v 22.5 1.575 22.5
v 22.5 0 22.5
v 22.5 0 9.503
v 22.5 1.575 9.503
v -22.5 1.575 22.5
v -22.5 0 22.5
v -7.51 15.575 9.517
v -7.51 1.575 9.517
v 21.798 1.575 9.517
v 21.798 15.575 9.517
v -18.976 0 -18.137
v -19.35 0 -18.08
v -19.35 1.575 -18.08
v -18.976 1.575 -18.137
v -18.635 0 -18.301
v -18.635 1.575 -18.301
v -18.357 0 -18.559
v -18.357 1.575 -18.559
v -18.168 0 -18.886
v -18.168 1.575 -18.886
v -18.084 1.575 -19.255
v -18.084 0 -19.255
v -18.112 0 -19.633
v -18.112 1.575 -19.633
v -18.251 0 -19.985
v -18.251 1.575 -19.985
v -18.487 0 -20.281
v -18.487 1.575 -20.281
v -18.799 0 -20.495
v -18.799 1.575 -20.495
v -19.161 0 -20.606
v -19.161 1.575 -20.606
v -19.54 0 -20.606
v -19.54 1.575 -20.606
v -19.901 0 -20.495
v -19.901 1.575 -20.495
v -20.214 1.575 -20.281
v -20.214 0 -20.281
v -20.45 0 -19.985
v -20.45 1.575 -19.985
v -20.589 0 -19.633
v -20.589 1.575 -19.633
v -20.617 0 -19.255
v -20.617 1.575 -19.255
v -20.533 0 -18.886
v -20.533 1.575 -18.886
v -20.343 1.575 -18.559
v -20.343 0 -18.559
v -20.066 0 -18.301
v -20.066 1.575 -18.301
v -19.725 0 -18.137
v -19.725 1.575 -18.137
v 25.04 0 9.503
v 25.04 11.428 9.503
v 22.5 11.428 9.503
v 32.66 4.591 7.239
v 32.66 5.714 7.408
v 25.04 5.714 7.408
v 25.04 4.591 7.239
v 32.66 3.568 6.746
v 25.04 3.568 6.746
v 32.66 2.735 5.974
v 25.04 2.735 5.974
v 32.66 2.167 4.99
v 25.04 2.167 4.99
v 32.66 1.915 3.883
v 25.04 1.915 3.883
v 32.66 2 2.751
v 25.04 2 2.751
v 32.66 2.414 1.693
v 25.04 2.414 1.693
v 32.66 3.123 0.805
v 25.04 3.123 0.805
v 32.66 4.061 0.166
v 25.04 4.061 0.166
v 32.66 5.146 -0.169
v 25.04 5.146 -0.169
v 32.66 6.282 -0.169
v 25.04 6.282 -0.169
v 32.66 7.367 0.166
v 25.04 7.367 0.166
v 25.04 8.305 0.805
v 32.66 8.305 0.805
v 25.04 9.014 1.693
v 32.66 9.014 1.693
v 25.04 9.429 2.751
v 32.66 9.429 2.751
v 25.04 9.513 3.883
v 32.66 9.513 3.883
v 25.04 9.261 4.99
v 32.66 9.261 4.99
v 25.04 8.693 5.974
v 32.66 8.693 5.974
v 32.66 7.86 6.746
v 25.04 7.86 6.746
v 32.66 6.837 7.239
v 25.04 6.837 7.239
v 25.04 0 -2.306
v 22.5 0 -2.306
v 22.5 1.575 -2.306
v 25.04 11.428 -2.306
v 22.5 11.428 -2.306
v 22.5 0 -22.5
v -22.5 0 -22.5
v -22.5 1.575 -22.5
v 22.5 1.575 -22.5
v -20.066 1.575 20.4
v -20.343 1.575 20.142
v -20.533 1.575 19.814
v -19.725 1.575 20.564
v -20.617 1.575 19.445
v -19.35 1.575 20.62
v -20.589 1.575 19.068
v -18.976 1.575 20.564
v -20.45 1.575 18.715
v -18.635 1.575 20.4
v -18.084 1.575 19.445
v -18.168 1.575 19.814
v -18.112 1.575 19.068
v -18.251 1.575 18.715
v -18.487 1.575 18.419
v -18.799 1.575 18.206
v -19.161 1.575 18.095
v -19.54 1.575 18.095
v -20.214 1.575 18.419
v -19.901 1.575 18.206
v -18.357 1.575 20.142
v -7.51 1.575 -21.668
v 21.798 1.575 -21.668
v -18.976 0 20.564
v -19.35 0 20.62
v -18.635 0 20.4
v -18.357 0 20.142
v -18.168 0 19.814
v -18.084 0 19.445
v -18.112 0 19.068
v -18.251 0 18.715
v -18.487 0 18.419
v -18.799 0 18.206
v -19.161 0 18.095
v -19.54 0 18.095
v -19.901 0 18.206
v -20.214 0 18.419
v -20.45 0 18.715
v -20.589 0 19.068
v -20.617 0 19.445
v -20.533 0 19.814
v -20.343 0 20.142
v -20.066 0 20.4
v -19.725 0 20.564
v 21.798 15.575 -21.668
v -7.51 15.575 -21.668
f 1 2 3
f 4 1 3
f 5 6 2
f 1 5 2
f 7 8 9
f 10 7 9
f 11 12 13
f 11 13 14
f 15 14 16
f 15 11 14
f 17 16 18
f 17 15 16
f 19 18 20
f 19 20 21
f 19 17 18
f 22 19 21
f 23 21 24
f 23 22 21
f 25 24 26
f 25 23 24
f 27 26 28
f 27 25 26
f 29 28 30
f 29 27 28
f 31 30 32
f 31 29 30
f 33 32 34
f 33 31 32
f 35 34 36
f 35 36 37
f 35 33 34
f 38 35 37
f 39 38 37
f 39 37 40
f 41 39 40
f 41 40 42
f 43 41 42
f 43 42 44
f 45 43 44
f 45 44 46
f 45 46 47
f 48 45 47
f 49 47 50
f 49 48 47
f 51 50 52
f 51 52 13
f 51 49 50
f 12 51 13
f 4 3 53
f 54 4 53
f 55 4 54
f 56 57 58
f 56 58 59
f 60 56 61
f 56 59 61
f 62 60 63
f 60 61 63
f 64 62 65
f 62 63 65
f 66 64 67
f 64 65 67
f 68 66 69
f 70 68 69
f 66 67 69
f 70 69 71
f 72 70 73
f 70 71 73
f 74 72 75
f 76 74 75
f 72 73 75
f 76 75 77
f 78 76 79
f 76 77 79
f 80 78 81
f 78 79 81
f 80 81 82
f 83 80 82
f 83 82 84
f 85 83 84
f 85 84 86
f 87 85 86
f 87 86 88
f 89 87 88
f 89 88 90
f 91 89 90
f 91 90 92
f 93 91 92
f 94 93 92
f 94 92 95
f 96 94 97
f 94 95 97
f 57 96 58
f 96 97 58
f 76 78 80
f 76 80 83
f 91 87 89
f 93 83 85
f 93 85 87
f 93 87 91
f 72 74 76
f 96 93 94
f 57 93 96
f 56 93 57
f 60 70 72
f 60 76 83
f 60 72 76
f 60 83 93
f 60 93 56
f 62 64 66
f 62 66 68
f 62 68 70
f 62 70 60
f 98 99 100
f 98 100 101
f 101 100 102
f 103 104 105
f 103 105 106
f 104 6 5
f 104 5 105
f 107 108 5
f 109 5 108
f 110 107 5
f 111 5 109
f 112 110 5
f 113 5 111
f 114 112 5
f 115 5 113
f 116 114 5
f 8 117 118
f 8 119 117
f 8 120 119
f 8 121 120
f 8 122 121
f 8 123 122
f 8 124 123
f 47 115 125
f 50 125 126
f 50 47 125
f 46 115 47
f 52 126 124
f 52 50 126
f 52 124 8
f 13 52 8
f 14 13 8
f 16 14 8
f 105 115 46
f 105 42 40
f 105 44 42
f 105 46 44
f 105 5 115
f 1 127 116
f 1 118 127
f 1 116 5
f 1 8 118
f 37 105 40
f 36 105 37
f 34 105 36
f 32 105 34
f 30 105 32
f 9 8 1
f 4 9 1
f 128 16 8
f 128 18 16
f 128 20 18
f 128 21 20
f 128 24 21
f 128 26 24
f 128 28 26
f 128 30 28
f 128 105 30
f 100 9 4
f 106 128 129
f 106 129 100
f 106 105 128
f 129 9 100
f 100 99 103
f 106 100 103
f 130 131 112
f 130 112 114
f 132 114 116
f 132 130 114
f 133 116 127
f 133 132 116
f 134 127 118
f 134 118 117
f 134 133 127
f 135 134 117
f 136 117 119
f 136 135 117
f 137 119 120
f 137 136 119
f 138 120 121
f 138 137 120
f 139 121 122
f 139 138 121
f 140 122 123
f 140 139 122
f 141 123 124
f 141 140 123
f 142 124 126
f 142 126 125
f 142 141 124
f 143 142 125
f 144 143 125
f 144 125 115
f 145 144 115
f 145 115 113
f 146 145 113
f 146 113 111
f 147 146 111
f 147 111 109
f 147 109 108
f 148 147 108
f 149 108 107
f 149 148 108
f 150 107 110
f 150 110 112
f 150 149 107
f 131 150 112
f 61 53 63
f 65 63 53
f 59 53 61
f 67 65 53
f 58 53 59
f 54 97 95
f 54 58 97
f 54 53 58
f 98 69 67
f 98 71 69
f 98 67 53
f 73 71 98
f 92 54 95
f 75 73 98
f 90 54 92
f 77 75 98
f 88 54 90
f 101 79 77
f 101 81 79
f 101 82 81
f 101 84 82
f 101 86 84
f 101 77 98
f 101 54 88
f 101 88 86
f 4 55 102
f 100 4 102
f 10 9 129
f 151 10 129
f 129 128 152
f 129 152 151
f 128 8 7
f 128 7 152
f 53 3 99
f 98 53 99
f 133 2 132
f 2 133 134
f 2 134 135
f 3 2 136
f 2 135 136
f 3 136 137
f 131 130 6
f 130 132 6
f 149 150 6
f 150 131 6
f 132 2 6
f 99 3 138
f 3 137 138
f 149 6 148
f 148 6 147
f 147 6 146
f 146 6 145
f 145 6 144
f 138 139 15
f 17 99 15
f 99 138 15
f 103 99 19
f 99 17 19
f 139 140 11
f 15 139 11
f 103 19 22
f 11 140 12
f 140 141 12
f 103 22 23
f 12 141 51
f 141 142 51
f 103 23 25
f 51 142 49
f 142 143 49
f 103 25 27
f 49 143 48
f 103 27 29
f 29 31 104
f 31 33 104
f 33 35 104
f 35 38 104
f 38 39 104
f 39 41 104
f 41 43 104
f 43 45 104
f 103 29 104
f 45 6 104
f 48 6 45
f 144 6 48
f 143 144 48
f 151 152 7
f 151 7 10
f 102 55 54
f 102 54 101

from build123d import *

# Parameters (mm, degrees)
SKETCH1_W           = 45
SKETCH1_H           = 45
SKETCH1_R           = 1.27
BOSS_EXTRUDE1_DEPTH = 1.5748
SKETCH2_W           = 29.307993044
SKETCH2_H           = 31.185373382
BOSS_EXTRUDE2_DEPTH = 14
SKETCH3_W           = 11.809383556
SKETCH3_H           = 11.428065242
BOSS_EXTRUDE3_DEPTH = 2.54
SKETCH4_R           = 3.81
BOSS_EXTRUDE4_DEPTH = 7.62


with BuildPart() as part:
    # Sketch1 → Boss-Extrude1 (new body)
    with BuildSketch(Plane(origin=(0, 0, 0), x_dir=(1, 0, 0), z_dir=(0, 1, 0))):
        Rectangle(SKETCH1_W, SKETCH1_H)
        with Locations(Location((-19.3504, 19.3504, 0), (0, 0, 270))):
            Circle(SKETCH1_R, mode=Mode.SUBTRACT)
        with Locations(Location((-19.3504, -19.3504, 0), (0, 0, 270))):
            Circle(SKETCH1_R, mode=Mode.SUBTRACT)
    extrude(amount=BOSS_EXTRUDE1_DEPTH)

    # Sketch2 → Boss-Extrude2 (add)
    with BuildSketch(Plane(origin=(0, 1.5748, 0), x_dir=(1, 0, 0), z_dir=(0, 1, 0))):
        with Locations((7.144475173, 6.07541137)):
            Rectangle(SKETCH2_W, SKETCH2_H)
    extrude(amount=BOSS_EXTRUDE2_DEPTH)

    # Sketch3 → Boss-Extrude3 (add)
    with BuildSketch(Plane(origin=(22.5, 0, 0), x_dir=(0, 0, -1), z_dir=(1, 0, 0))):
        with Locations((-3.598382338, 5.714032621)):
            Rectangle(SKETCH3_W, SKETCH3_H)
    extrude(amount=BOSS_EXTRUDE3_DEPTH)

    # Sketch4 → Boss-Extrude4 (add)
    with BuildSketch(Plane(origin=(25.04, 0, 0), x_dir=(0, 0, -1), z_dir=(1, 0, 0))):
        with Locations(Location((-3.598382338, 5.714032621, 0), (0, 0, 180))):
            Circle(SKETCH4_R)
    extrude(amount=BOSS_EXTRUDE4_DEPTH)


solid = part.part
